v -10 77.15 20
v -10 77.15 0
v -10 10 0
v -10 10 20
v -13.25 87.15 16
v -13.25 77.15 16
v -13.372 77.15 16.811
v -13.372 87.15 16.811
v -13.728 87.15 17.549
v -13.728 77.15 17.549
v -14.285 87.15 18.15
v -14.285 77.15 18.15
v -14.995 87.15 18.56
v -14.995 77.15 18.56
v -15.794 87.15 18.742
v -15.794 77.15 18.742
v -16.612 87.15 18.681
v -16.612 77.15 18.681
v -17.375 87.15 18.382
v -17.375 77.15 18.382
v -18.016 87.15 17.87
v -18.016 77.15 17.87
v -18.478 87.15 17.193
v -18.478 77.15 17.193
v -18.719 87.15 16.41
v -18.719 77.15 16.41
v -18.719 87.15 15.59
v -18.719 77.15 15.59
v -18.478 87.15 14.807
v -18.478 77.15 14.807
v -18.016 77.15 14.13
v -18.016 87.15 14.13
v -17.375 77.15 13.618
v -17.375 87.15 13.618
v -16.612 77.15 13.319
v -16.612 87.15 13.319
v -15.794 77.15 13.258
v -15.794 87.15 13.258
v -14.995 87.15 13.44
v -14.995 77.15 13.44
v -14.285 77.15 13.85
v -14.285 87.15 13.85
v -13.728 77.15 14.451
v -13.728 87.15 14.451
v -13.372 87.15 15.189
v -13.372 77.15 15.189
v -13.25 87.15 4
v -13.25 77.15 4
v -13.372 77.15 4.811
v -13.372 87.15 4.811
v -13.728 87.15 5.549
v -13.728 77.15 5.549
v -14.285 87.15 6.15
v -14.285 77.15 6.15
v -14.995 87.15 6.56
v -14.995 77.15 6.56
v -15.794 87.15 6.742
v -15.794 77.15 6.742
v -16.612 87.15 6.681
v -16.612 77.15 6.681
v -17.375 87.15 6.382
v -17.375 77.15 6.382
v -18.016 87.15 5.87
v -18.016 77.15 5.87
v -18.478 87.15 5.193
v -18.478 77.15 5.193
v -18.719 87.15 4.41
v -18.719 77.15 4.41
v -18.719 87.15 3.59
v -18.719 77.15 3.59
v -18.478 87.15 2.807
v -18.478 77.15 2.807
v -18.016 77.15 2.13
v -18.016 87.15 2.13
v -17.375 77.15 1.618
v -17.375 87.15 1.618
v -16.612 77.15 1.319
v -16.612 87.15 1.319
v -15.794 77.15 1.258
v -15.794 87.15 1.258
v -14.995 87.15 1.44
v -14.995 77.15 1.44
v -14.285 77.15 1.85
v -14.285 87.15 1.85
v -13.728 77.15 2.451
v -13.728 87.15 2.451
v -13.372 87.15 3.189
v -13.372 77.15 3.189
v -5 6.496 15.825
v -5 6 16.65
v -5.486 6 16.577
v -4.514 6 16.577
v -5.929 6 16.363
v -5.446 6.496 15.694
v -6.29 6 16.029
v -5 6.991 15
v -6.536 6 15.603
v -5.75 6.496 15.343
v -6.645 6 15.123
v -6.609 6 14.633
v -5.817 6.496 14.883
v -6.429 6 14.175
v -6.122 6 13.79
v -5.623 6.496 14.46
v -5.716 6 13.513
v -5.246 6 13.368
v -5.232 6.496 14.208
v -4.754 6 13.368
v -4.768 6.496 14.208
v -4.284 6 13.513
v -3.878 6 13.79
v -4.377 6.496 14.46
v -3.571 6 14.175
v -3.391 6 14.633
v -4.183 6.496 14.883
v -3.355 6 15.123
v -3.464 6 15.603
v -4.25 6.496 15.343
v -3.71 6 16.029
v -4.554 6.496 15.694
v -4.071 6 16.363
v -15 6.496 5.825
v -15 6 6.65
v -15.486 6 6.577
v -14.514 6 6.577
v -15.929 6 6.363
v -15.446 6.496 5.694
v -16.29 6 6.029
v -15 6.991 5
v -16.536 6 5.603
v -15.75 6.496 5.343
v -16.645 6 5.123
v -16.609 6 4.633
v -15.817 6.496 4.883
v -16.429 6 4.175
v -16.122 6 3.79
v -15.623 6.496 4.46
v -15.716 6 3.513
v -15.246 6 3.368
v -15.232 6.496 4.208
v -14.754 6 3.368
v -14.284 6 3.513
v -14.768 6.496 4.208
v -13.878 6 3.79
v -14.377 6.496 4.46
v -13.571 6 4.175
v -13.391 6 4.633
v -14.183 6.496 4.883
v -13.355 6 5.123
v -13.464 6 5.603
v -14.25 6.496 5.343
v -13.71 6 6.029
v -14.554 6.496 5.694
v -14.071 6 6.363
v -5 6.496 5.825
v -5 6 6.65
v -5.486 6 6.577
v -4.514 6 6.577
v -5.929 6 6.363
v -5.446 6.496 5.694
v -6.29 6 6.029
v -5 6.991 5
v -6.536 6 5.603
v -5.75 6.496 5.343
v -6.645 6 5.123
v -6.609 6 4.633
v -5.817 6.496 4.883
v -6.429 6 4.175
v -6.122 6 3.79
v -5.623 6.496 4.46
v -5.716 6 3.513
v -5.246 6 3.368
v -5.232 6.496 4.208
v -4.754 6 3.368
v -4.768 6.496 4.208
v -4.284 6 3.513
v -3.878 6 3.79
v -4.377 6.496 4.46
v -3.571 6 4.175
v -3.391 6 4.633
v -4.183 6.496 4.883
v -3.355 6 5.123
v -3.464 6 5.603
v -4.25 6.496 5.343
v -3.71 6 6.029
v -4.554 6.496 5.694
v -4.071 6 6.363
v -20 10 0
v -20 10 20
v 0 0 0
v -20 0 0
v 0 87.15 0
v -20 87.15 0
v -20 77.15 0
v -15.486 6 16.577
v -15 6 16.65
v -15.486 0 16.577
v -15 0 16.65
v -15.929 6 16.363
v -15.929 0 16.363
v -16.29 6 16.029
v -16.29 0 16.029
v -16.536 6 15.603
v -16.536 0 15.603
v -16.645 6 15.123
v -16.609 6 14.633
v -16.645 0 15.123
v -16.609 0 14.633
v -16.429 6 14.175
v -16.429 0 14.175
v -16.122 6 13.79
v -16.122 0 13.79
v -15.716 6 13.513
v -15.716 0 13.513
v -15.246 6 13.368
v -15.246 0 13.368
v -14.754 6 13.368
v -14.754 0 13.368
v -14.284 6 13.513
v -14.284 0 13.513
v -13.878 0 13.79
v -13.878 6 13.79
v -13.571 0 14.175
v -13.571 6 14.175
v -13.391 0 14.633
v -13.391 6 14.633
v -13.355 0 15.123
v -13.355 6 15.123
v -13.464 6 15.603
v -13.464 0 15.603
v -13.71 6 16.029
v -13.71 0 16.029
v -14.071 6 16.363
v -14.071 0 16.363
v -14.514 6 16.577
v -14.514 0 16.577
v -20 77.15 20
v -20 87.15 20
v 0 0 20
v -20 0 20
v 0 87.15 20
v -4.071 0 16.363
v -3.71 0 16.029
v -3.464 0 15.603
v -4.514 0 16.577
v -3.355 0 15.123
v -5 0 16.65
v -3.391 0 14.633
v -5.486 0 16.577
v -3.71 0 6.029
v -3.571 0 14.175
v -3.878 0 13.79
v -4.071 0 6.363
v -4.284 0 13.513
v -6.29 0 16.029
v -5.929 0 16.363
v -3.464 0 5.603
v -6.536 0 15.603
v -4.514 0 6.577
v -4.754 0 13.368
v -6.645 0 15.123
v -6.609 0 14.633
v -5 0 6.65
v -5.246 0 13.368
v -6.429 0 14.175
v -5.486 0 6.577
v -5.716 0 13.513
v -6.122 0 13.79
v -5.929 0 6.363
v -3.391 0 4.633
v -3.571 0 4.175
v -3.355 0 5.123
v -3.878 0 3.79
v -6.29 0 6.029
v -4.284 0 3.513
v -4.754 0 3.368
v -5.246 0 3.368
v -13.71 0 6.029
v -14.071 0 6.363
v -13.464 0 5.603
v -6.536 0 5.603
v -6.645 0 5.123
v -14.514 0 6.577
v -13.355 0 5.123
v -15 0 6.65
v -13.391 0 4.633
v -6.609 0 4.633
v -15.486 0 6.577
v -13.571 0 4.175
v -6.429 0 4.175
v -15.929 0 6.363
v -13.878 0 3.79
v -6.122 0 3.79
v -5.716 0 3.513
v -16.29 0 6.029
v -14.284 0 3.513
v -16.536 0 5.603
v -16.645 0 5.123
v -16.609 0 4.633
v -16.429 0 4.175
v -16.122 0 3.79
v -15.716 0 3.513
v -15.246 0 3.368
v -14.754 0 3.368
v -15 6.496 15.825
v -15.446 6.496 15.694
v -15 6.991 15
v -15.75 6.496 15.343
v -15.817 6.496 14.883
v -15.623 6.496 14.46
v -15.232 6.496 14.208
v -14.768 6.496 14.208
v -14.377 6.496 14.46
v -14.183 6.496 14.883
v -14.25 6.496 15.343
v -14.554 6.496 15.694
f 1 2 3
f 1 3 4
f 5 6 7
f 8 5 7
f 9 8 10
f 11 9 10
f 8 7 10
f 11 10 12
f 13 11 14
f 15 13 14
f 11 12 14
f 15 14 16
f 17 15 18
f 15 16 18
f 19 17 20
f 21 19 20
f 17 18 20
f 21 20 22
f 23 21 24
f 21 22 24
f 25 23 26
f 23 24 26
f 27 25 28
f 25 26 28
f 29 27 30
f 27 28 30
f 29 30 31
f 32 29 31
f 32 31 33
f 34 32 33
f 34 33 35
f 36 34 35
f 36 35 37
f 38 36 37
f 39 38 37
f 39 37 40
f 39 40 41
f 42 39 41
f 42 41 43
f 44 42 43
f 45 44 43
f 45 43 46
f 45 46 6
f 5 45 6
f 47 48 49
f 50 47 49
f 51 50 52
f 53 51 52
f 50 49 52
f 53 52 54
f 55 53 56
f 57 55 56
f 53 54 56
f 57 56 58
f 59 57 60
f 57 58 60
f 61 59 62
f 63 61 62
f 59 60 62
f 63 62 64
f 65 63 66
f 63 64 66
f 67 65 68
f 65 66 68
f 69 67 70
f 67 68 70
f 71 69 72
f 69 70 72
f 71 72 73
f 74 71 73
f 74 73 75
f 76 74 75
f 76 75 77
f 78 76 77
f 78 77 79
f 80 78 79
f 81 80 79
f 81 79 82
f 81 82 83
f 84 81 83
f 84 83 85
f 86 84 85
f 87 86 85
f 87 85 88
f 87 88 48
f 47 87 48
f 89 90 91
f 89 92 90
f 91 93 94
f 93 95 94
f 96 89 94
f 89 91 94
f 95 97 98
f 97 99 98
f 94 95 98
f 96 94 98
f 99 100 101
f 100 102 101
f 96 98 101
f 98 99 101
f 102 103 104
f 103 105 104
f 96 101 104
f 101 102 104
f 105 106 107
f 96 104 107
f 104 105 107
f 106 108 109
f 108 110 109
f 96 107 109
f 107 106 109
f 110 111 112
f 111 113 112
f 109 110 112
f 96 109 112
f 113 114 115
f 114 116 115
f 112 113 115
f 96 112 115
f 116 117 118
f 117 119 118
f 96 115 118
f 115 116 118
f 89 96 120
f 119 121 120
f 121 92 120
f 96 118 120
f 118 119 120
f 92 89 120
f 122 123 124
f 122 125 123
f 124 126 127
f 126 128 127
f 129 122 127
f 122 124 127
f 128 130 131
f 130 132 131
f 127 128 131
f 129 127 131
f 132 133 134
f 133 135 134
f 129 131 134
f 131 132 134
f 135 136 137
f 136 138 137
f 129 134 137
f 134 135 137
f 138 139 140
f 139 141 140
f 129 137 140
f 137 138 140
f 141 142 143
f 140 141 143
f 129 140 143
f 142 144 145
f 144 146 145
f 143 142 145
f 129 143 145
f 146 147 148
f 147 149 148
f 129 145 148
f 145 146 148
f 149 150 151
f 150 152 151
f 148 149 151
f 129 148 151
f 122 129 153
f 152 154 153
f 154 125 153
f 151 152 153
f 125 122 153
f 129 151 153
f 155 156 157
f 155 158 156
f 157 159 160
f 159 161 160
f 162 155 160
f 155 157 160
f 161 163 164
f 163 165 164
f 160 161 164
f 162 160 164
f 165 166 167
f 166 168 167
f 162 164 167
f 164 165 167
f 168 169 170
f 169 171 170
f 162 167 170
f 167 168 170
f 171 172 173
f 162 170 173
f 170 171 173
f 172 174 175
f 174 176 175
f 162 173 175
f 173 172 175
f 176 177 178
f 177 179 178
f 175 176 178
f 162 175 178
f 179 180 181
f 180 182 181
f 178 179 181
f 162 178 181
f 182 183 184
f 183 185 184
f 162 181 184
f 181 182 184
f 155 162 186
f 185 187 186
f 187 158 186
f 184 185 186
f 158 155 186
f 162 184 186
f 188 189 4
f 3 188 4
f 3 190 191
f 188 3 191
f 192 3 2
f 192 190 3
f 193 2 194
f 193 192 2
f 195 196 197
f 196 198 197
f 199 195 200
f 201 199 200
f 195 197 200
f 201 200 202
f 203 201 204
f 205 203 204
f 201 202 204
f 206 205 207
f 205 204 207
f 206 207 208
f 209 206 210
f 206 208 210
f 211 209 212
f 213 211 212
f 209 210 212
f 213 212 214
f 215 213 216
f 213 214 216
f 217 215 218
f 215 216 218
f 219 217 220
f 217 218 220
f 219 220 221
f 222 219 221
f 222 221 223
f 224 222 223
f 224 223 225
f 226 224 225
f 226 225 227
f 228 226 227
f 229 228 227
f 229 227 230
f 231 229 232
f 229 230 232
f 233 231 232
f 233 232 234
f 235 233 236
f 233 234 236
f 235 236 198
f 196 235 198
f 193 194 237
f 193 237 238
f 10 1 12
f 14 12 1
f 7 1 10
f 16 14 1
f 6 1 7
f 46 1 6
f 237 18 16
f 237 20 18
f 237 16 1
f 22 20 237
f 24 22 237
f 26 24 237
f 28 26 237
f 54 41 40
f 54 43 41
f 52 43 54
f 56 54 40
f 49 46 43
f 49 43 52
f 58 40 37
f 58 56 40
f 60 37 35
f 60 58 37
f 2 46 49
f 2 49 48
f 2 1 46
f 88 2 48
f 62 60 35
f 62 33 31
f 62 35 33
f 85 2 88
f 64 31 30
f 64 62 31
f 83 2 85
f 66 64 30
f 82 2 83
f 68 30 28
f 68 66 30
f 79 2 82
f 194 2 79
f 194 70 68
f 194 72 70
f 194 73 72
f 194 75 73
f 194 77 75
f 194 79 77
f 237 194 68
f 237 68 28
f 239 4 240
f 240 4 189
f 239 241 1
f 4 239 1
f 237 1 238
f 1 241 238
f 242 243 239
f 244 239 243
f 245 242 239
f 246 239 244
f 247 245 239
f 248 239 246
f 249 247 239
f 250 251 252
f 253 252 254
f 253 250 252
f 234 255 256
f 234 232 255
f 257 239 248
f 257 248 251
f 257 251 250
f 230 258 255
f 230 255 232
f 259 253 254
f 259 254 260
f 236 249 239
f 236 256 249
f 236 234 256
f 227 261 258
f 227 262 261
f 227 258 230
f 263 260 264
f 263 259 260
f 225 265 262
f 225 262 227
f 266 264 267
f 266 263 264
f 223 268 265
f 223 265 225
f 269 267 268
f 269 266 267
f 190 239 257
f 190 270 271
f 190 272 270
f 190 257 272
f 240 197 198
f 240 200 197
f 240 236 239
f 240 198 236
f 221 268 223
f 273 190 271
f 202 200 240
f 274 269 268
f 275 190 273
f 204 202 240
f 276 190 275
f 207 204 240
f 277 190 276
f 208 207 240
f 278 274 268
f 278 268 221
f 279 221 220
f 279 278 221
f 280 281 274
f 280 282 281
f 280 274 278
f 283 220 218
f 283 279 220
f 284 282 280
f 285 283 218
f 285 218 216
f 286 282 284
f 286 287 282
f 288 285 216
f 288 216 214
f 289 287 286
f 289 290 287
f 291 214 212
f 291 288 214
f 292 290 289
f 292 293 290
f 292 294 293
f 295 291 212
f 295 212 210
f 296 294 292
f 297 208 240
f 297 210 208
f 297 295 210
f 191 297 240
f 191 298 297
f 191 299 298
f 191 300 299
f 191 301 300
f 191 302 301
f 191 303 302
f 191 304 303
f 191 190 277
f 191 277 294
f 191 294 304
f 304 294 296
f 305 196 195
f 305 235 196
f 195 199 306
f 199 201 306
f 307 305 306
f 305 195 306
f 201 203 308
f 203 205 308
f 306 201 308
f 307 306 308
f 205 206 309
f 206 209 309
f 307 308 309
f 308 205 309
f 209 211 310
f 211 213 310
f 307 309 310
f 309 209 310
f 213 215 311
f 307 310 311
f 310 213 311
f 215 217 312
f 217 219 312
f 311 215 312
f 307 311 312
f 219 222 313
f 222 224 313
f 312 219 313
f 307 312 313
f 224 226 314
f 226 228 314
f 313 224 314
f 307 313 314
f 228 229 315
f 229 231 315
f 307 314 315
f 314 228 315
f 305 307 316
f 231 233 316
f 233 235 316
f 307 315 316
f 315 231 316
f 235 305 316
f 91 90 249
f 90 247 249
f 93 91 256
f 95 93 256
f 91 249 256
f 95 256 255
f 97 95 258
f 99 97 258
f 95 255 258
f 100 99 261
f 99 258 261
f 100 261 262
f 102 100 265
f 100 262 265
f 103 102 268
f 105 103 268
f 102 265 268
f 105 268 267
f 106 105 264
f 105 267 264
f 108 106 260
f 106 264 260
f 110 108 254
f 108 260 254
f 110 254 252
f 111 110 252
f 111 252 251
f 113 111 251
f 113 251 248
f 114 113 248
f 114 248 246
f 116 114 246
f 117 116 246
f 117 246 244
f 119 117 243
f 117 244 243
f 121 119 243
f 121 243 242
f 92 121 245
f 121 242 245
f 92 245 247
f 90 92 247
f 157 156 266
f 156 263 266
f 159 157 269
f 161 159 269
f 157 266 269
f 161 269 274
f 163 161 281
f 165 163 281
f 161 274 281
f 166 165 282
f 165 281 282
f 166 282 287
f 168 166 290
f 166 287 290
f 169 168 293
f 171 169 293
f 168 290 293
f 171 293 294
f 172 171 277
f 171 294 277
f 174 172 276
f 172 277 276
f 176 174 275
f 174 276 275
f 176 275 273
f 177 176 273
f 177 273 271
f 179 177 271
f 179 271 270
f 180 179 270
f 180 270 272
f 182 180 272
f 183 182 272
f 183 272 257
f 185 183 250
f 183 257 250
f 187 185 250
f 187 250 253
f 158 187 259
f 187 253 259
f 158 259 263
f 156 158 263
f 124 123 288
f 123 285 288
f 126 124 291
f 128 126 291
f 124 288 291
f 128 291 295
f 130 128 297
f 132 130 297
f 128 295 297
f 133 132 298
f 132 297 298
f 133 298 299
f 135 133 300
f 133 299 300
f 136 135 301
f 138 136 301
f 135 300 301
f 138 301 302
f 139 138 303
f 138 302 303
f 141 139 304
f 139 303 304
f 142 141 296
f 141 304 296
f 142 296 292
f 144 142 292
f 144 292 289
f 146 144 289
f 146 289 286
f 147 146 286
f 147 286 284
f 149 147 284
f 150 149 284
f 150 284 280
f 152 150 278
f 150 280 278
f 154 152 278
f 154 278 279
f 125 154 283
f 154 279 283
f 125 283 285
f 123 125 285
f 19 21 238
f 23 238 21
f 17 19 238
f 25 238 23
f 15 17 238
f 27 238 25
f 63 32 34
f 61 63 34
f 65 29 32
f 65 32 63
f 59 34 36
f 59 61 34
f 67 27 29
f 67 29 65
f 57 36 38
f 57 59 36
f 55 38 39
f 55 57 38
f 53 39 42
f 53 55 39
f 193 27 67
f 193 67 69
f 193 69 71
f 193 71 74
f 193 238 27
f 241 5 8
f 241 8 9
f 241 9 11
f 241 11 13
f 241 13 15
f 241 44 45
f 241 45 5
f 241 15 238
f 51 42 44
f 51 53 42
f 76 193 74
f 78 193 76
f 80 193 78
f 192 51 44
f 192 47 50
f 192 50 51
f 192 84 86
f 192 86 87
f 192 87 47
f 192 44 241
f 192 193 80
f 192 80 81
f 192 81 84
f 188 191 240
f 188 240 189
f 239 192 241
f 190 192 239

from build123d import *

# Parameters (mm, degrees)
EXTRUDE_1_DEPTH             = 20
HOLE_WIZARD_M4_1_AT_2_COUNT = 2
HOLE_WIZARD_M4_1_AT_2_PITCH = 10
HOLE_WIZARD_M4_1_AT_3_COUNT = 2
HOLE_WIZARD_M4_1_AT_3_PITCH = 10
HOLE_WIZARD_M4_1_AT_4_COUNT = 2
HOLE_WIZARD_M4_1_AT_4_PITCH = 14.142135624
SKETCH_5_W                  = 20
SKETCH_5_H                  = 20
EXTRUDE_2_DEPTH             = 10
SKETCH_6_W                  = 20
SKETCH_6_H                  = 47
CUT_EXTRUDE_2_DEPTH         = 5
SKETCH_7_W                  = 10
SKETCH_7_H                  = 20.15
CUT_EXTRUDE_3_DEPTH         = 21
SKETCH_8_R                  = 2.75
CUT_EXTRUDE_4_DEPTH         = 11


with BuildPart() as part:
    # 草图1 → 凸台-拉伸1 (new body)
    with BuildSketch(Plane.XY):
        Polygon((-20, 30.15), (-15, 30.15), (-15, 77.15), (-20, 77.15), (-20, 87.15), (0, 87.15), (0, 0), (-20, 0), align=None)
    extrude(amount=EXTRUDE_1_DEPTH)

    # 草图3 → M4 螺纹孔1 (revolve, cut)
    with BuildSketch(Plane(origin=(-15, 87.15, 5), x_dir=(0, 0, 1), z_dir=(1, 0, 0))):
        Polygon((0, 0), (0, 6.991420021), (1.65, 6), (1.65, 0), align=None)
    hole_wizard_m4_1 = revolve(axis=Axis((-15, 93.5, 5), (0, -1, 0)), mode=Mode.SUBTRACT)

    # M4 螺纹孔1 at 2: M4 螺纹孔1 ×2
    with Locations(*[(i * HOLE_WIZARD_M4_1_AT_2_PITCH, 0, 0) for i in range(1, HOLE_WIZARD_M4_1_AT_2_COUNT)]):
        add(hole_wizard_m4_1, mode=Mode.SUBTRACT)

    # M4 螺纹孔1 at 3: M4 螺纹孔1 ×2
    with Locations(*[(0, 0, i * HOLE_WIZARD_M4_1_AT_3_PITCH) for i in range(1, HOLE_WIZARD_M4_1_AT_3_COUNT)]):
        add(hole_wizard_m4_1, mode=Mode.SUBTRACT)

    # M4 螺纹孔1 at 4: M4 螺纹孔1 ×2
    with Locations(*[Vector(0.707106781, 0, 0.707106781) * (i * HOLE_WIZARD_M4_1_AT_4_PITCH) for i in range(1, HOLE_WIZARD_M4_1_AT_4_COUNT)]):
        add(hole_wizard_m4_1, mode=Mode.SUBTRACT)

    # 镜向1: M4 螺纹孔1 across plane
    add(hole_wizard_m4_1.mirror(Plane.ZX.offset(43.575)), mode=Mode.SUBTRACT)

    # 镜向1 copy 1 sketch → 镜向1 copy 1 (revolve, cut)
    with BuildSketch(Plane(origin=(-5, 0, 5), x_dir=(0, 0, 1), z_dir=(1, 0, 0))):
        Polygon((0, 0), (0, -6.991420021), (1.65, -6), (1.65, 0), align=None)
    revolve(axis=Axis((-5, -6.35, 5), (0, -1, 0)), mode=Mode.SUBTRACT)

    # 镜向1 copy 2 sketch → 镜向1 copy 2 (revolve, cut)
    with BuildSketch(Plane(origin=(-15, 0, 15), x_dir=(0, 0, 1), z_dir=(1, 0, 0))):
        Polygon((0, 0), (0, -6.991420021), (1.65, -6), (1.65, 0), align=None)
    revolve(axis=Axis((-15, -6.35, 15), (0, -1, 0)), mode=Mode.SUBTRACT)

    # 镜向1 copy 3 sketch → 镜向1 copy 3 (revolve, cut)
    with BuildSketch(Plane(origin=(-5, 0, 15), x_dir=(0, 0, 1), z_dir=(1, 0, 0))):
        Polygon((0, 0), (0, -6.991420021), (1.65, -6), (1.65, 0), align=None)
    revolve(axis=Axis((-5, -6.35, 15), (0, -1, 0)), mode=Mode.SUBTRACT)

    # 草图5 → 凸台-拉伸2 (add)
    with BuildSketch(Plane(origin=(0, 87.15, 0), x_dir=(1, 0, 0), z_dir=(0, 1, 0))):
        with Locations((-10, -10)):
            Rectangle(SKETCH_5_W, SKETCH_5_H)
    extrude(amount=-EXTRUDE_2_DEPTH)

    # 草图6 → 切除-拉伸2 (cut)
    with BuildSketch(Plane.ZY.offset(15)):
        with Locations((10, 53.65)):
            Rectangle(SKETCH_6_W, SKETCH_6_H)
    extrude(amount=-CUT_EXTRUDE_2_DEPTH, mode=Mode.SUBTRACT)

    # 草图7 → 切除-拉伸3 (cut, through all)
    with BuildSketch(Plane.XY.offset(20)):
        with Locations((-15, 20.075)):
            Rectangle(SKETCH_7_W, SKETCH_7_H)
    extrude(amount=-CUT_EXTRUDE_3_DEPTH, mode=Mode.SUBTRACT)

    # 草图8 → 切除-拉伸4 (cut, through all)
    with BuildSketch(Plane.XZ.offset(-77.15)):
        with Locations((-16, 4)):
            Circle(SKETCH_8_R)
        with Locations((-16, 16)):
            Circle(SKETCH_8_R)
    extrude(amount=-CUT_EXTRUDE_4_DEPTH, mode=Mode.SUBTRACT)


solid = part.part
